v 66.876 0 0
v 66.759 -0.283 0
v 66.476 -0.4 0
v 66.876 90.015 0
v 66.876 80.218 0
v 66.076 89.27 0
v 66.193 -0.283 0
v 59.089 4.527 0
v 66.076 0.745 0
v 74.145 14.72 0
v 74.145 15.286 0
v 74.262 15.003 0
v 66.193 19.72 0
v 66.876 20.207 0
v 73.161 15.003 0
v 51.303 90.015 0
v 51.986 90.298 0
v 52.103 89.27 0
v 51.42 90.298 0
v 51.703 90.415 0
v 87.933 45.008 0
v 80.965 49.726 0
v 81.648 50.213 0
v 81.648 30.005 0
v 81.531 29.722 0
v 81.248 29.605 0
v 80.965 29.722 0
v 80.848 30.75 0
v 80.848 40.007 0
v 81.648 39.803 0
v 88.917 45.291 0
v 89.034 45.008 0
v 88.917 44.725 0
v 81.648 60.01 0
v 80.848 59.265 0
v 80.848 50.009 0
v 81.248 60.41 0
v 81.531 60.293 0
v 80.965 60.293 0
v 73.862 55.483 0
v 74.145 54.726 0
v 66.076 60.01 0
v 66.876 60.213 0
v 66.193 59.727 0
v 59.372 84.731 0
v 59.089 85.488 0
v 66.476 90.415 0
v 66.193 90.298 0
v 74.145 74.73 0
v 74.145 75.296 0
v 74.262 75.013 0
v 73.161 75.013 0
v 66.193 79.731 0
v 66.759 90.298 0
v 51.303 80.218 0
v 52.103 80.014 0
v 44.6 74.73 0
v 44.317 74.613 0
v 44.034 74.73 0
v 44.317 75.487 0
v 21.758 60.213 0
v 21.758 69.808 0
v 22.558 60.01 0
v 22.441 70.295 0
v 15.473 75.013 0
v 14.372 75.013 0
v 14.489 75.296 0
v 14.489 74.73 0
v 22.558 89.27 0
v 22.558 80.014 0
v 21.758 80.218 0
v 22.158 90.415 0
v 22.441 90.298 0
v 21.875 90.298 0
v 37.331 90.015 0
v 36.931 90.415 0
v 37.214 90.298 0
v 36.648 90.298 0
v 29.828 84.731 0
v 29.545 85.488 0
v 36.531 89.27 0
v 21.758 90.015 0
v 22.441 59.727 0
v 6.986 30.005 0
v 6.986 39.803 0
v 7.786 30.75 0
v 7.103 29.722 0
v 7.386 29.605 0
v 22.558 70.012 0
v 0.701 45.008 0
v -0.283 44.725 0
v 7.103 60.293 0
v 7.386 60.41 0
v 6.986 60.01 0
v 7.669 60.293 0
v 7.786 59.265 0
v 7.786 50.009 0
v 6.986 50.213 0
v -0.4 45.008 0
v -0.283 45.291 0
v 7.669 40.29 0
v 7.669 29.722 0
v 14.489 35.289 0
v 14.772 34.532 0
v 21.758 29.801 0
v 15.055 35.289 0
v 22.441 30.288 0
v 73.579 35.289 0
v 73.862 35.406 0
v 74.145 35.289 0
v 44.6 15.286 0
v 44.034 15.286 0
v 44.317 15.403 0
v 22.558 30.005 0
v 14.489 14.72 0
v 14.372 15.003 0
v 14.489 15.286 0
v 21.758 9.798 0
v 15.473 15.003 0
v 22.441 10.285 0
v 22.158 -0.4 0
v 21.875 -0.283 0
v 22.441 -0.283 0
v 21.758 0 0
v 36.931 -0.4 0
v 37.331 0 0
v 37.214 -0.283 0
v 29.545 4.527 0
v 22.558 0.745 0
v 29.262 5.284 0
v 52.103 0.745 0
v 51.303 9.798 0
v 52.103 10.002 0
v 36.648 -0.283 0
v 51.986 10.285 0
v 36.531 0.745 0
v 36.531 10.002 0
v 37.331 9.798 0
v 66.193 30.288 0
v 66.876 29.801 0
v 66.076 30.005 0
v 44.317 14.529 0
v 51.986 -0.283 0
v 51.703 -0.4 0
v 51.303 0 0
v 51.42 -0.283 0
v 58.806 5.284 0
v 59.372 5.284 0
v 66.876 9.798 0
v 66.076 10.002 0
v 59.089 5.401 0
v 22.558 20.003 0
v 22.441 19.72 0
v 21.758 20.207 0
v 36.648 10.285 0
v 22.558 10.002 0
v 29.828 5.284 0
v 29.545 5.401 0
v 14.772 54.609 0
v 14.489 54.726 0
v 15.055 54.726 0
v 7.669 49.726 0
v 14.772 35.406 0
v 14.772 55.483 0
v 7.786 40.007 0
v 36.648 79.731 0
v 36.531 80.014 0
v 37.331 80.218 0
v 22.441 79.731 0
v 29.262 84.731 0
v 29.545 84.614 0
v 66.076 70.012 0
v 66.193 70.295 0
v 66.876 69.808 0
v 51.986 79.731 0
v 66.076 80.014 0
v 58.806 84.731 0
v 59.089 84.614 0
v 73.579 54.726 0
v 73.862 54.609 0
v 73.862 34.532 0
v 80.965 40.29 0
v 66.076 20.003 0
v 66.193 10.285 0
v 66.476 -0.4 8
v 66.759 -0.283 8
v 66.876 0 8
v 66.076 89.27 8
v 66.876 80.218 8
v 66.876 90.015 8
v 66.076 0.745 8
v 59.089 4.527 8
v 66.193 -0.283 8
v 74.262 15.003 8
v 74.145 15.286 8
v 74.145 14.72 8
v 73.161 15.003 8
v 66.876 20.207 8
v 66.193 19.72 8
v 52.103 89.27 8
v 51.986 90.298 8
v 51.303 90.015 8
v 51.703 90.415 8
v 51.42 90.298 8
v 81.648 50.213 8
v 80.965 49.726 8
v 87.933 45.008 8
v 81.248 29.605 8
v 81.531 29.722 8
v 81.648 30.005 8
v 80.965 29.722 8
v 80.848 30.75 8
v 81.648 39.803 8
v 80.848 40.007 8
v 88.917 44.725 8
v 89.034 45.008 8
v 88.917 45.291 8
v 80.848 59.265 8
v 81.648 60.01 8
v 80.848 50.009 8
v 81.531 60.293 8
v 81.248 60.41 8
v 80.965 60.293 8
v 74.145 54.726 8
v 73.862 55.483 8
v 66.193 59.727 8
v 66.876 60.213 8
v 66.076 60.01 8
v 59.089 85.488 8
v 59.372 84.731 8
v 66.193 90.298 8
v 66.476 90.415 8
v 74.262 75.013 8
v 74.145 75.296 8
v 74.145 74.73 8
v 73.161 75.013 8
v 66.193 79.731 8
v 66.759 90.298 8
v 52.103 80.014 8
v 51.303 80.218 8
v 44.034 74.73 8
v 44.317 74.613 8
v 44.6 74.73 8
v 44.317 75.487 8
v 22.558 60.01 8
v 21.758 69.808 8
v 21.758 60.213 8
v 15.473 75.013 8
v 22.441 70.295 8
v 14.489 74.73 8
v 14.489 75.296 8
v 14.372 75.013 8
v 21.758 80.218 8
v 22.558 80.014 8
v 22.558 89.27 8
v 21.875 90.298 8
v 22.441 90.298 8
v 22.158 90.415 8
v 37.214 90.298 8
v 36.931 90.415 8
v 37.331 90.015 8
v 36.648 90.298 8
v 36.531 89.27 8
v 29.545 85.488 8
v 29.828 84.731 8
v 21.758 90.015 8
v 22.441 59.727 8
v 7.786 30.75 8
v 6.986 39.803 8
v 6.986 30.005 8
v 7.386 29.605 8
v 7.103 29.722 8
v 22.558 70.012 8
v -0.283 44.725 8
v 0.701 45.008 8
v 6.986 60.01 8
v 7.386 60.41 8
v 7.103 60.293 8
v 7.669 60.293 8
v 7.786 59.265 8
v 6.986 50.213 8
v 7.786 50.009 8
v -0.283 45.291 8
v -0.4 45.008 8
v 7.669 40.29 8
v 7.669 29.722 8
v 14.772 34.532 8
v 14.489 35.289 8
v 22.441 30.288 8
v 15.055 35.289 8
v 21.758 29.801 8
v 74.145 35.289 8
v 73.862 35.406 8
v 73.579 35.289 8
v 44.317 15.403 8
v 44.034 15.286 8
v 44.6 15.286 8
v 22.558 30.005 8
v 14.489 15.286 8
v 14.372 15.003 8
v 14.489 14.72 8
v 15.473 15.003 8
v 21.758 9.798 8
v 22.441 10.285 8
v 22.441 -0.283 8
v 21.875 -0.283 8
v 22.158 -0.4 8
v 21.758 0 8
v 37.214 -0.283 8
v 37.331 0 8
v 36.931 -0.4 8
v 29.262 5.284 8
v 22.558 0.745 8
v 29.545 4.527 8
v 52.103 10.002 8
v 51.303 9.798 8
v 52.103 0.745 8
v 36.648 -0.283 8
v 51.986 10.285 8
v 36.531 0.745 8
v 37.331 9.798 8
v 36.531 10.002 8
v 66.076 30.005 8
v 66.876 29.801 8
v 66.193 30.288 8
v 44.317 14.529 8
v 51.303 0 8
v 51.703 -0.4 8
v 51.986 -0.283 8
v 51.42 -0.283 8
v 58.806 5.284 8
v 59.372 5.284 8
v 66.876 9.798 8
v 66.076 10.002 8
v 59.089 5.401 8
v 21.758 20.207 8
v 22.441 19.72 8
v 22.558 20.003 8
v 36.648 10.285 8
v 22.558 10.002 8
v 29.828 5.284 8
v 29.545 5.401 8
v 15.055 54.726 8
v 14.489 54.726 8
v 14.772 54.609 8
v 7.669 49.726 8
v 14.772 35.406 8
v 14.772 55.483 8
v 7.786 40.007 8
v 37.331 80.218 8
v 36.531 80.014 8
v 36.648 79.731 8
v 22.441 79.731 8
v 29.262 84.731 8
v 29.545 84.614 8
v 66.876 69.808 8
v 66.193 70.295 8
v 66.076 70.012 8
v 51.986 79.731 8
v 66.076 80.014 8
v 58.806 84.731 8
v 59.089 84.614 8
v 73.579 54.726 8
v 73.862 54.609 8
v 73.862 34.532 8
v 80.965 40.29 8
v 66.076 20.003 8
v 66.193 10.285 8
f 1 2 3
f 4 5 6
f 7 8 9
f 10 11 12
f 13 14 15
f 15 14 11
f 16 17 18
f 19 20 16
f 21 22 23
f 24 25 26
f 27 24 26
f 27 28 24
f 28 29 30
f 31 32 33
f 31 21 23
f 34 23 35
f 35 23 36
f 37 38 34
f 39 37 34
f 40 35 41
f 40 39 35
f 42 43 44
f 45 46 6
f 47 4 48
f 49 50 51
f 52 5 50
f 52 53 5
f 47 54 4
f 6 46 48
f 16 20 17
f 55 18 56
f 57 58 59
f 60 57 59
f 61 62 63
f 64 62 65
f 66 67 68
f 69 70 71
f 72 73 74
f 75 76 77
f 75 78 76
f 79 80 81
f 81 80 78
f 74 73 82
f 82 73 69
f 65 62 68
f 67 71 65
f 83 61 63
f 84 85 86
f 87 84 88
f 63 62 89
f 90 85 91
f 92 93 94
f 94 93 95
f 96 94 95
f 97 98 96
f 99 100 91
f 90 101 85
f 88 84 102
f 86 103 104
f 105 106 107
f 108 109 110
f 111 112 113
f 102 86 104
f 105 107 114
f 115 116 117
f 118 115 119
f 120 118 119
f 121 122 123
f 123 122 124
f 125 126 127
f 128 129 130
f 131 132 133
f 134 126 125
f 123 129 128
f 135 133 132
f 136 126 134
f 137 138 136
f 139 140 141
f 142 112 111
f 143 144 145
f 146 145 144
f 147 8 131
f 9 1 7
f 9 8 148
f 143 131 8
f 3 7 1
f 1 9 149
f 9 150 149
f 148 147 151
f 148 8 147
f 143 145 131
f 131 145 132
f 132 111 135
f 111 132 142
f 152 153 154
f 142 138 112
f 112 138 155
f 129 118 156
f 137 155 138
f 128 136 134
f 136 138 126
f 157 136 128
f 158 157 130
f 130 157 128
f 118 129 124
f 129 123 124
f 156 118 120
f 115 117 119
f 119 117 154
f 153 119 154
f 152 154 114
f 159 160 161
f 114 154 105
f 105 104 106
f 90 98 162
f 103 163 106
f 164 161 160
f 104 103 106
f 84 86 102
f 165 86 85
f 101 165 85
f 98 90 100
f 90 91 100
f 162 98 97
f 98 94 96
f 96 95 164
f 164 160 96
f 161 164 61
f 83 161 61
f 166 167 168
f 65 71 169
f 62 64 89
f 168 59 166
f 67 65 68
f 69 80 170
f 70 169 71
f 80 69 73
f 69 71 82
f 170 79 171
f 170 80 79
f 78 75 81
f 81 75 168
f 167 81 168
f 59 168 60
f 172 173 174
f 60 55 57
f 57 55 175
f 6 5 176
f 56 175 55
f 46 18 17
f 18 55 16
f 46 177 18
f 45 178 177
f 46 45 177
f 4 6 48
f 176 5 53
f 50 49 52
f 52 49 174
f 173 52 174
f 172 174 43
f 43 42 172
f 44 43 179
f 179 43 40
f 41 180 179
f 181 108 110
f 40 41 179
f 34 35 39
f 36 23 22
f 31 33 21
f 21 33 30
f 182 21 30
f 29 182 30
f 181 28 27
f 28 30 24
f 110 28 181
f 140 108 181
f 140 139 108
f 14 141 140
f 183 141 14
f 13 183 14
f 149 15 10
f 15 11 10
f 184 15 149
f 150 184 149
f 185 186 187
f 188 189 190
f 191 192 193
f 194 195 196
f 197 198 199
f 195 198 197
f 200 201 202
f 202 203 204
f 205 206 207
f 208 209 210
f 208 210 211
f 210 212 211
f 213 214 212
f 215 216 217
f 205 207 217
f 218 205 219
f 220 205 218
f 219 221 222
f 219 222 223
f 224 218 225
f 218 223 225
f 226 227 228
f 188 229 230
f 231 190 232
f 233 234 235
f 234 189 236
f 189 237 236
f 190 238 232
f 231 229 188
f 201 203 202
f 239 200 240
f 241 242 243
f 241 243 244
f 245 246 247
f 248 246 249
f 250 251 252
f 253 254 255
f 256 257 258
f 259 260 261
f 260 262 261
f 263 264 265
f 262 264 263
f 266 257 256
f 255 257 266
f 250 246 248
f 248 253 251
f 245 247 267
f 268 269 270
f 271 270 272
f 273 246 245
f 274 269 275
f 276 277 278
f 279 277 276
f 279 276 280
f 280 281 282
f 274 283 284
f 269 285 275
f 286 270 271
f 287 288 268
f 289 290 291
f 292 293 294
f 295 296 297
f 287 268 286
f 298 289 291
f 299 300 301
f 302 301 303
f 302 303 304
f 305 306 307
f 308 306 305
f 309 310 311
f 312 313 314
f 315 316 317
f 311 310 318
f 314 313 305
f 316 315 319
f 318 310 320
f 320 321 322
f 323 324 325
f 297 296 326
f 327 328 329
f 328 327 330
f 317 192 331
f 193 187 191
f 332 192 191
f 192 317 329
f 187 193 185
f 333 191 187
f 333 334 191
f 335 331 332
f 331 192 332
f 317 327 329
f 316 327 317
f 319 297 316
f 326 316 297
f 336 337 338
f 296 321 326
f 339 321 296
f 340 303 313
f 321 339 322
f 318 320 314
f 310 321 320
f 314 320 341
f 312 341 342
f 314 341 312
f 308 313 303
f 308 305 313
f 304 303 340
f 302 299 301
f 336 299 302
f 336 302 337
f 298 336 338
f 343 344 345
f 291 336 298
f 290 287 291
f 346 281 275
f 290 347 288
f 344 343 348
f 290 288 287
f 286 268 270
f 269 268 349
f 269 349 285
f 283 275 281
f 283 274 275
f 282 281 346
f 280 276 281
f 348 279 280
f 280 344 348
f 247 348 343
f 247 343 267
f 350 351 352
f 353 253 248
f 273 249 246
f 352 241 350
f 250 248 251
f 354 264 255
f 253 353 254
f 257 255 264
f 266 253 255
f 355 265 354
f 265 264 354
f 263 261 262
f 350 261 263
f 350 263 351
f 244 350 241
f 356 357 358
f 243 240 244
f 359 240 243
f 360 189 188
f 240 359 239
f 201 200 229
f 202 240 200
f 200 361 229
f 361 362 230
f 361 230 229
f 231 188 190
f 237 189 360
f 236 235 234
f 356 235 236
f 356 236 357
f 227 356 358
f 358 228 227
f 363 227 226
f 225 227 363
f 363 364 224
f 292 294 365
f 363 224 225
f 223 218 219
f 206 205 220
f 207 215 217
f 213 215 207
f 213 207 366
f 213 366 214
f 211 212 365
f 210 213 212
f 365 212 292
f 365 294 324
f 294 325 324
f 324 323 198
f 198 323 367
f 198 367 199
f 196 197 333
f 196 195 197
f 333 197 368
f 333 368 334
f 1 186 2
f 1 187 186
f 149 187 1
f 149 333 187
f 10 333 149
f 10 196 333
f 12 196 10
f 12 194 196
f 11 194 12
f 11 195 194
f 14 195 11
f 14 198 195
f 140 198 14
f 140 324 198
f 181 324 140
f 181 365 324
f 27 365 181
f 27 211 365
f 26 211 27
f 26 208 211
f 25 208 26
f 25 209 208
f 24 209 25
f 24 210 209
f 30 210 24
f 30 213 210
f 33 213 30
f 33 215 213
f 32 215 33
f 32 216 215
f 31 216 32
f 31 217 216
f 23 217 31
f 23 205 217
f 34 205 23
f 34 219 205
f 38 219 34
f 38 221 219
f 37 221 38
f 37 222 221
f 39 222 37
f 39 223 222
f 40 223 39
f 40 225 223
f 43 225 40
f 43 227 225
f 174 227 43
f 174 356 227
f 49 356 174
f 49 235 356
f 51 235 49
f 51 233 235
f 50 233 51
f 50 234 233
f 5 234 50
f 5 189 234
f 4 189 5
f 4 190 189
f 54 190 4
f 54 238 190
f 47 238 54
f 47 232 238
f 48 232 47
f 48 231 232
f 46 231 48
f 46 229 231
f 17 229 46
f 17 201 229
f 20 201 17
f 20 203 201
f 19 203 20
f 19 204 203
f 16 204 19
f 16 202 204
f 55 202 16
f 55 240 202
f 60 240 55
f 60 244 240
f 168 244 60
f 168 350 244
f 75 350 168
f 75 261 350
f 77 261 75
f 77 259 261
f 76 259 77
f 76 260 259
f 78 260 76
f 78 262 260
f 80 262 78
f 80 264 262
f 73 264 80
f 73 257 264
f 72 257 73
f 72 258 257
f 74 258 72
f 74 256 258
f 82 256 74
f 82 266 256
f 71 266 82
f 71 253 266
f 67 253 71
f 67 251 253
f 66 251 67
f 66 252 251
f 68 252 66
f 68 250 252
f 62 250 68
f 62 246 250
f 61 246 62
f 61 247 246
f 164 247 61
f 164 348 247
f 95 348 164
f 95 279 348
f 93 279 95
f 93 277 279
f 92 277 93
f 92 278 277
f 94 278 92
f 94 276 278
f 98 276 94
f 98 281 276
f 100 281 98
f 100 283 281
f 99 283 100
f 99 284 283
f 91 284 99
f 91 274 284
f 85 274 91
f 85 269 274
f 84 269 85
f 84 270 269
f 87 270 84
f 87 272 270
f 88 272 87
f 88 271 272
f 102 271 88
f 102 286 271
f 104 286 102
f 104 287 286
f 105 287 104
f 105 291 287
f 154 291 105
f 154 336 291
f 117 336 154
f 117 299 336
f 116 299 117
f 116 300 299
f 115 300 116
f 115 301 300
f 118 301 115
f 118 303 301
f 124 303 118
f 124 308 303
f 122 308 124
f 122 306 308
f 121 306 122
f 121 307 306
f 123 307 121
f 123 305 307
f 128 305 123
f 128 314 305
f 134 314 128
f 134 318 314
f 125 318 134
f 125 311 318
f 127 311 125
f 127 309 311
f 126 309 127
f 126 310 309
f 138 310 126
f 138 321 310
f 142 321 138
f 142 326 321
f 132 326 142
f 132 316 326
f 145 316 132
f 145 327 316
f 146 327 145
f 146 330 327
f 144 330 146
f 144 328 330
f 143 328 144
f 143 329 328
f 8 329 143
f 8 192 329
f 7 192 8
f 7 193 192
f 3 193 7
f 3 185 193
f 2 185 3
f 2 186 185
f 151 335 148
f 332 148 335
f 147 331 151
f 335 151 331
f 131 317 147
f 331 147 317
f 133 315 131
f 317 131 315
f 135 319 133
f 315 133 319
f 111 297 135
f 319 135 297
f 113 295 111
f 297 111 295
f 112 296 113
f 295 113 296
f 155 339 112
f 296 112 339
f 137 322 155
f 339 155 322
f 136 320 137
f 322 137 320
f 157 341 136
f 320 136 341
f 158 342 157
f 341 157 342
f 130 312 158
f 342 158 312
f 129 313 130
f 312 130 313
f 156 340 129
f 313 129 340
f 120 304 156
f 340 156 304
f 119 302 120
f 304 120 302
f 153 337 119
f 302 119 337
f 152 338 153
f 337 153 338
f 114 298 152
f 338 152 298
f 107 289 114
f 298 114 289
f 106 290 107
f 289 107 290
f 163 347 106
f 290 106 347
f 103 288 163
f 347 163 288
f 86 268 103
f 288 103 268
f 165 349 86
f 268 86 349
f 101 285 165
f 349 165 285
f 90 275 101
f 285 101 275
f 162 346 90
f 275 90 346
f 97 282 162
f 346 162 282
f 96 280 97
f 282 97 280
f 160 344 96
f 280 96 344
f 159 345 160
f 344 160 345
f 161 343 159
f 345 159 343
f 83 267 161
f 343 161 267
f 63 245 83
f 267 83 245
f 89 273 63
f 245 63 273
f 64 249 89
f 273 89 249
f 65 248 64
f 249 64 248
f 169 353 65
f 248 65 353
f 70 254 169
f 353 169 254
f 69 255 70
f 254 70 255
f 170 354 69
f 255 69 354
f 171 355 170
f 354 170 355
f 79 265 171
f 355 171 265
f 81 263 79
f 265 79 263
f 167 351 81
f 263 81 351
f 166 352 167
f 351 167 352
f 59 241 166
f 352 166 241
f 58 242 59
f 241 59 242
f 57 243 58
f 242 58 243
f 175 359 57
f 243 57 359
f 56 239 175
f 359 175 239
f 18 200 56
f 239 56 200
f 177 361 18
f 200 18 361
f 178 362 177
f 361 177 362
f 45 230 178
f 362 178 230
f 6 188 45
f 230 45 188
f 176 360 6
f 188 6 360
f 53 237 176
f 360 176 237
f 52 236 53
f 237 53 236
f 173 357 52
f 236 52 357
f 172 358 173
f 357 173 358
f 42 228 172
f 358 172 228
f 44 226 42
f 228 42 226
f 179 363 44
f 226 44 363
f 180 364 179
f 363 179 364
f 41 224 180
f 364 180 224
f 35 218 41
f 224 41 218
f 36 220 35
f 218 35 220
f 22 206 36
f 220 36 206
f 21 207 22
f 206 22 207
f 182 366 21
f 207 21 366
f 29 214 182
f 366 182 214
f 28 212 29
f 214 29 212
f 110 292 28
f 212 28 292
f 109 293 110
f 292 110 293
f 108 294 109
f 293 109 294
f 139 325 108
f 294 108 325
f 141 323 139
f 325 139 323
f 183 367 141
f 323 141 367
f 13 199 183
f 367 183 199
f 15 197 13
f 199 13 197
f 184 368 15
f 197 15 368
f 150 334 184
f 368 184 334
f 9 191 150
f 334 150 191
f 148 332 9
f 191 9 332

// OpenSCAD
// OpenSCAD file automatically generated by svg2cookiercutter.py
wallHeight = 12;
wallFlareWidth = 3;
wallFlareThickness = 1.5;
minWallWidth = 1;
maxWallWidth = 3;
insideWallFlareWidth = 2;
insideWallFlareThickness = 1.5;
minInsideWallWidth = 1;
maxInsideWallWidth = 3;
featureHeight = 8;
minFeatureThickness = 0.8;
maxFeatureThickness = 3;
connectorThickness = 1;
size = 90.015;

module dummy() {}

scale = size/90.015;

module ribbon(points, thickness=1, closed=false) {
    p = closed ? concat(points, [points[0]]) : points;
    
    union() {
        for (i=[1:len(p)-1]) {
            hull() {
                translate(p[i-1]) circle(d=thickness, $fn=8);
                translate(p[i]) circle(d=thickness, $fn=8);
            }
        }
    }
}

module cookieCutter() {

path0=scale*[[-66.609,-0.927],[-66.609,9.075],[-73.995,14.076],[-66.609,19.076],[-66.609,29.078],[-73.995,34.079],[-81.381,29.078],[-81.381,39.080],[-88.767,44.081],[-81.381,49.082],[-81.381,59.083],[-73.995,54.082],[-66.609,59.083],[-66.609,69.085],[-73.995,74.086],[-66.609,79.087],[-66.609,89.088],[-59.222,84.087],[-51.836,89.088],[-51.836,79.087],[-44.450,74.086],[-37.064,79.087],[-37.064,89.088],[-29.678,84.087],[-22.291,89.088],[-22.291,79.087],[-14.905,74.086],[-22.291,69.085],[-22.291,59.083],[-14.905,54.082],[-7.519,59.083],[-7.519,49.082],[-0.133,44.081],[-7.519,39.080],[-7.519,29.078],[-14.905,34.079],[-22.291,29.078],[-22.291,19.076],[-14.905,14.076],[-22.291,9.075],[-22.291,-0.927],[-29.678,4.074],[-37.064,-0.927],[-37.064,9.075],[-44.450,14.076],[-51.836,9.075],[-51.836,-0.927],[-59.222,4.074],[-66.609,-0.927]];
render(convexity=10) linear_extrude(height=(featureHeight)) ribbon(path0,thickness=min(maxFeatureThickness,max(0.144,minFeatureThickness)));
}

translate([88.767*scale,0.927*scale,0]) cookieCutter();
